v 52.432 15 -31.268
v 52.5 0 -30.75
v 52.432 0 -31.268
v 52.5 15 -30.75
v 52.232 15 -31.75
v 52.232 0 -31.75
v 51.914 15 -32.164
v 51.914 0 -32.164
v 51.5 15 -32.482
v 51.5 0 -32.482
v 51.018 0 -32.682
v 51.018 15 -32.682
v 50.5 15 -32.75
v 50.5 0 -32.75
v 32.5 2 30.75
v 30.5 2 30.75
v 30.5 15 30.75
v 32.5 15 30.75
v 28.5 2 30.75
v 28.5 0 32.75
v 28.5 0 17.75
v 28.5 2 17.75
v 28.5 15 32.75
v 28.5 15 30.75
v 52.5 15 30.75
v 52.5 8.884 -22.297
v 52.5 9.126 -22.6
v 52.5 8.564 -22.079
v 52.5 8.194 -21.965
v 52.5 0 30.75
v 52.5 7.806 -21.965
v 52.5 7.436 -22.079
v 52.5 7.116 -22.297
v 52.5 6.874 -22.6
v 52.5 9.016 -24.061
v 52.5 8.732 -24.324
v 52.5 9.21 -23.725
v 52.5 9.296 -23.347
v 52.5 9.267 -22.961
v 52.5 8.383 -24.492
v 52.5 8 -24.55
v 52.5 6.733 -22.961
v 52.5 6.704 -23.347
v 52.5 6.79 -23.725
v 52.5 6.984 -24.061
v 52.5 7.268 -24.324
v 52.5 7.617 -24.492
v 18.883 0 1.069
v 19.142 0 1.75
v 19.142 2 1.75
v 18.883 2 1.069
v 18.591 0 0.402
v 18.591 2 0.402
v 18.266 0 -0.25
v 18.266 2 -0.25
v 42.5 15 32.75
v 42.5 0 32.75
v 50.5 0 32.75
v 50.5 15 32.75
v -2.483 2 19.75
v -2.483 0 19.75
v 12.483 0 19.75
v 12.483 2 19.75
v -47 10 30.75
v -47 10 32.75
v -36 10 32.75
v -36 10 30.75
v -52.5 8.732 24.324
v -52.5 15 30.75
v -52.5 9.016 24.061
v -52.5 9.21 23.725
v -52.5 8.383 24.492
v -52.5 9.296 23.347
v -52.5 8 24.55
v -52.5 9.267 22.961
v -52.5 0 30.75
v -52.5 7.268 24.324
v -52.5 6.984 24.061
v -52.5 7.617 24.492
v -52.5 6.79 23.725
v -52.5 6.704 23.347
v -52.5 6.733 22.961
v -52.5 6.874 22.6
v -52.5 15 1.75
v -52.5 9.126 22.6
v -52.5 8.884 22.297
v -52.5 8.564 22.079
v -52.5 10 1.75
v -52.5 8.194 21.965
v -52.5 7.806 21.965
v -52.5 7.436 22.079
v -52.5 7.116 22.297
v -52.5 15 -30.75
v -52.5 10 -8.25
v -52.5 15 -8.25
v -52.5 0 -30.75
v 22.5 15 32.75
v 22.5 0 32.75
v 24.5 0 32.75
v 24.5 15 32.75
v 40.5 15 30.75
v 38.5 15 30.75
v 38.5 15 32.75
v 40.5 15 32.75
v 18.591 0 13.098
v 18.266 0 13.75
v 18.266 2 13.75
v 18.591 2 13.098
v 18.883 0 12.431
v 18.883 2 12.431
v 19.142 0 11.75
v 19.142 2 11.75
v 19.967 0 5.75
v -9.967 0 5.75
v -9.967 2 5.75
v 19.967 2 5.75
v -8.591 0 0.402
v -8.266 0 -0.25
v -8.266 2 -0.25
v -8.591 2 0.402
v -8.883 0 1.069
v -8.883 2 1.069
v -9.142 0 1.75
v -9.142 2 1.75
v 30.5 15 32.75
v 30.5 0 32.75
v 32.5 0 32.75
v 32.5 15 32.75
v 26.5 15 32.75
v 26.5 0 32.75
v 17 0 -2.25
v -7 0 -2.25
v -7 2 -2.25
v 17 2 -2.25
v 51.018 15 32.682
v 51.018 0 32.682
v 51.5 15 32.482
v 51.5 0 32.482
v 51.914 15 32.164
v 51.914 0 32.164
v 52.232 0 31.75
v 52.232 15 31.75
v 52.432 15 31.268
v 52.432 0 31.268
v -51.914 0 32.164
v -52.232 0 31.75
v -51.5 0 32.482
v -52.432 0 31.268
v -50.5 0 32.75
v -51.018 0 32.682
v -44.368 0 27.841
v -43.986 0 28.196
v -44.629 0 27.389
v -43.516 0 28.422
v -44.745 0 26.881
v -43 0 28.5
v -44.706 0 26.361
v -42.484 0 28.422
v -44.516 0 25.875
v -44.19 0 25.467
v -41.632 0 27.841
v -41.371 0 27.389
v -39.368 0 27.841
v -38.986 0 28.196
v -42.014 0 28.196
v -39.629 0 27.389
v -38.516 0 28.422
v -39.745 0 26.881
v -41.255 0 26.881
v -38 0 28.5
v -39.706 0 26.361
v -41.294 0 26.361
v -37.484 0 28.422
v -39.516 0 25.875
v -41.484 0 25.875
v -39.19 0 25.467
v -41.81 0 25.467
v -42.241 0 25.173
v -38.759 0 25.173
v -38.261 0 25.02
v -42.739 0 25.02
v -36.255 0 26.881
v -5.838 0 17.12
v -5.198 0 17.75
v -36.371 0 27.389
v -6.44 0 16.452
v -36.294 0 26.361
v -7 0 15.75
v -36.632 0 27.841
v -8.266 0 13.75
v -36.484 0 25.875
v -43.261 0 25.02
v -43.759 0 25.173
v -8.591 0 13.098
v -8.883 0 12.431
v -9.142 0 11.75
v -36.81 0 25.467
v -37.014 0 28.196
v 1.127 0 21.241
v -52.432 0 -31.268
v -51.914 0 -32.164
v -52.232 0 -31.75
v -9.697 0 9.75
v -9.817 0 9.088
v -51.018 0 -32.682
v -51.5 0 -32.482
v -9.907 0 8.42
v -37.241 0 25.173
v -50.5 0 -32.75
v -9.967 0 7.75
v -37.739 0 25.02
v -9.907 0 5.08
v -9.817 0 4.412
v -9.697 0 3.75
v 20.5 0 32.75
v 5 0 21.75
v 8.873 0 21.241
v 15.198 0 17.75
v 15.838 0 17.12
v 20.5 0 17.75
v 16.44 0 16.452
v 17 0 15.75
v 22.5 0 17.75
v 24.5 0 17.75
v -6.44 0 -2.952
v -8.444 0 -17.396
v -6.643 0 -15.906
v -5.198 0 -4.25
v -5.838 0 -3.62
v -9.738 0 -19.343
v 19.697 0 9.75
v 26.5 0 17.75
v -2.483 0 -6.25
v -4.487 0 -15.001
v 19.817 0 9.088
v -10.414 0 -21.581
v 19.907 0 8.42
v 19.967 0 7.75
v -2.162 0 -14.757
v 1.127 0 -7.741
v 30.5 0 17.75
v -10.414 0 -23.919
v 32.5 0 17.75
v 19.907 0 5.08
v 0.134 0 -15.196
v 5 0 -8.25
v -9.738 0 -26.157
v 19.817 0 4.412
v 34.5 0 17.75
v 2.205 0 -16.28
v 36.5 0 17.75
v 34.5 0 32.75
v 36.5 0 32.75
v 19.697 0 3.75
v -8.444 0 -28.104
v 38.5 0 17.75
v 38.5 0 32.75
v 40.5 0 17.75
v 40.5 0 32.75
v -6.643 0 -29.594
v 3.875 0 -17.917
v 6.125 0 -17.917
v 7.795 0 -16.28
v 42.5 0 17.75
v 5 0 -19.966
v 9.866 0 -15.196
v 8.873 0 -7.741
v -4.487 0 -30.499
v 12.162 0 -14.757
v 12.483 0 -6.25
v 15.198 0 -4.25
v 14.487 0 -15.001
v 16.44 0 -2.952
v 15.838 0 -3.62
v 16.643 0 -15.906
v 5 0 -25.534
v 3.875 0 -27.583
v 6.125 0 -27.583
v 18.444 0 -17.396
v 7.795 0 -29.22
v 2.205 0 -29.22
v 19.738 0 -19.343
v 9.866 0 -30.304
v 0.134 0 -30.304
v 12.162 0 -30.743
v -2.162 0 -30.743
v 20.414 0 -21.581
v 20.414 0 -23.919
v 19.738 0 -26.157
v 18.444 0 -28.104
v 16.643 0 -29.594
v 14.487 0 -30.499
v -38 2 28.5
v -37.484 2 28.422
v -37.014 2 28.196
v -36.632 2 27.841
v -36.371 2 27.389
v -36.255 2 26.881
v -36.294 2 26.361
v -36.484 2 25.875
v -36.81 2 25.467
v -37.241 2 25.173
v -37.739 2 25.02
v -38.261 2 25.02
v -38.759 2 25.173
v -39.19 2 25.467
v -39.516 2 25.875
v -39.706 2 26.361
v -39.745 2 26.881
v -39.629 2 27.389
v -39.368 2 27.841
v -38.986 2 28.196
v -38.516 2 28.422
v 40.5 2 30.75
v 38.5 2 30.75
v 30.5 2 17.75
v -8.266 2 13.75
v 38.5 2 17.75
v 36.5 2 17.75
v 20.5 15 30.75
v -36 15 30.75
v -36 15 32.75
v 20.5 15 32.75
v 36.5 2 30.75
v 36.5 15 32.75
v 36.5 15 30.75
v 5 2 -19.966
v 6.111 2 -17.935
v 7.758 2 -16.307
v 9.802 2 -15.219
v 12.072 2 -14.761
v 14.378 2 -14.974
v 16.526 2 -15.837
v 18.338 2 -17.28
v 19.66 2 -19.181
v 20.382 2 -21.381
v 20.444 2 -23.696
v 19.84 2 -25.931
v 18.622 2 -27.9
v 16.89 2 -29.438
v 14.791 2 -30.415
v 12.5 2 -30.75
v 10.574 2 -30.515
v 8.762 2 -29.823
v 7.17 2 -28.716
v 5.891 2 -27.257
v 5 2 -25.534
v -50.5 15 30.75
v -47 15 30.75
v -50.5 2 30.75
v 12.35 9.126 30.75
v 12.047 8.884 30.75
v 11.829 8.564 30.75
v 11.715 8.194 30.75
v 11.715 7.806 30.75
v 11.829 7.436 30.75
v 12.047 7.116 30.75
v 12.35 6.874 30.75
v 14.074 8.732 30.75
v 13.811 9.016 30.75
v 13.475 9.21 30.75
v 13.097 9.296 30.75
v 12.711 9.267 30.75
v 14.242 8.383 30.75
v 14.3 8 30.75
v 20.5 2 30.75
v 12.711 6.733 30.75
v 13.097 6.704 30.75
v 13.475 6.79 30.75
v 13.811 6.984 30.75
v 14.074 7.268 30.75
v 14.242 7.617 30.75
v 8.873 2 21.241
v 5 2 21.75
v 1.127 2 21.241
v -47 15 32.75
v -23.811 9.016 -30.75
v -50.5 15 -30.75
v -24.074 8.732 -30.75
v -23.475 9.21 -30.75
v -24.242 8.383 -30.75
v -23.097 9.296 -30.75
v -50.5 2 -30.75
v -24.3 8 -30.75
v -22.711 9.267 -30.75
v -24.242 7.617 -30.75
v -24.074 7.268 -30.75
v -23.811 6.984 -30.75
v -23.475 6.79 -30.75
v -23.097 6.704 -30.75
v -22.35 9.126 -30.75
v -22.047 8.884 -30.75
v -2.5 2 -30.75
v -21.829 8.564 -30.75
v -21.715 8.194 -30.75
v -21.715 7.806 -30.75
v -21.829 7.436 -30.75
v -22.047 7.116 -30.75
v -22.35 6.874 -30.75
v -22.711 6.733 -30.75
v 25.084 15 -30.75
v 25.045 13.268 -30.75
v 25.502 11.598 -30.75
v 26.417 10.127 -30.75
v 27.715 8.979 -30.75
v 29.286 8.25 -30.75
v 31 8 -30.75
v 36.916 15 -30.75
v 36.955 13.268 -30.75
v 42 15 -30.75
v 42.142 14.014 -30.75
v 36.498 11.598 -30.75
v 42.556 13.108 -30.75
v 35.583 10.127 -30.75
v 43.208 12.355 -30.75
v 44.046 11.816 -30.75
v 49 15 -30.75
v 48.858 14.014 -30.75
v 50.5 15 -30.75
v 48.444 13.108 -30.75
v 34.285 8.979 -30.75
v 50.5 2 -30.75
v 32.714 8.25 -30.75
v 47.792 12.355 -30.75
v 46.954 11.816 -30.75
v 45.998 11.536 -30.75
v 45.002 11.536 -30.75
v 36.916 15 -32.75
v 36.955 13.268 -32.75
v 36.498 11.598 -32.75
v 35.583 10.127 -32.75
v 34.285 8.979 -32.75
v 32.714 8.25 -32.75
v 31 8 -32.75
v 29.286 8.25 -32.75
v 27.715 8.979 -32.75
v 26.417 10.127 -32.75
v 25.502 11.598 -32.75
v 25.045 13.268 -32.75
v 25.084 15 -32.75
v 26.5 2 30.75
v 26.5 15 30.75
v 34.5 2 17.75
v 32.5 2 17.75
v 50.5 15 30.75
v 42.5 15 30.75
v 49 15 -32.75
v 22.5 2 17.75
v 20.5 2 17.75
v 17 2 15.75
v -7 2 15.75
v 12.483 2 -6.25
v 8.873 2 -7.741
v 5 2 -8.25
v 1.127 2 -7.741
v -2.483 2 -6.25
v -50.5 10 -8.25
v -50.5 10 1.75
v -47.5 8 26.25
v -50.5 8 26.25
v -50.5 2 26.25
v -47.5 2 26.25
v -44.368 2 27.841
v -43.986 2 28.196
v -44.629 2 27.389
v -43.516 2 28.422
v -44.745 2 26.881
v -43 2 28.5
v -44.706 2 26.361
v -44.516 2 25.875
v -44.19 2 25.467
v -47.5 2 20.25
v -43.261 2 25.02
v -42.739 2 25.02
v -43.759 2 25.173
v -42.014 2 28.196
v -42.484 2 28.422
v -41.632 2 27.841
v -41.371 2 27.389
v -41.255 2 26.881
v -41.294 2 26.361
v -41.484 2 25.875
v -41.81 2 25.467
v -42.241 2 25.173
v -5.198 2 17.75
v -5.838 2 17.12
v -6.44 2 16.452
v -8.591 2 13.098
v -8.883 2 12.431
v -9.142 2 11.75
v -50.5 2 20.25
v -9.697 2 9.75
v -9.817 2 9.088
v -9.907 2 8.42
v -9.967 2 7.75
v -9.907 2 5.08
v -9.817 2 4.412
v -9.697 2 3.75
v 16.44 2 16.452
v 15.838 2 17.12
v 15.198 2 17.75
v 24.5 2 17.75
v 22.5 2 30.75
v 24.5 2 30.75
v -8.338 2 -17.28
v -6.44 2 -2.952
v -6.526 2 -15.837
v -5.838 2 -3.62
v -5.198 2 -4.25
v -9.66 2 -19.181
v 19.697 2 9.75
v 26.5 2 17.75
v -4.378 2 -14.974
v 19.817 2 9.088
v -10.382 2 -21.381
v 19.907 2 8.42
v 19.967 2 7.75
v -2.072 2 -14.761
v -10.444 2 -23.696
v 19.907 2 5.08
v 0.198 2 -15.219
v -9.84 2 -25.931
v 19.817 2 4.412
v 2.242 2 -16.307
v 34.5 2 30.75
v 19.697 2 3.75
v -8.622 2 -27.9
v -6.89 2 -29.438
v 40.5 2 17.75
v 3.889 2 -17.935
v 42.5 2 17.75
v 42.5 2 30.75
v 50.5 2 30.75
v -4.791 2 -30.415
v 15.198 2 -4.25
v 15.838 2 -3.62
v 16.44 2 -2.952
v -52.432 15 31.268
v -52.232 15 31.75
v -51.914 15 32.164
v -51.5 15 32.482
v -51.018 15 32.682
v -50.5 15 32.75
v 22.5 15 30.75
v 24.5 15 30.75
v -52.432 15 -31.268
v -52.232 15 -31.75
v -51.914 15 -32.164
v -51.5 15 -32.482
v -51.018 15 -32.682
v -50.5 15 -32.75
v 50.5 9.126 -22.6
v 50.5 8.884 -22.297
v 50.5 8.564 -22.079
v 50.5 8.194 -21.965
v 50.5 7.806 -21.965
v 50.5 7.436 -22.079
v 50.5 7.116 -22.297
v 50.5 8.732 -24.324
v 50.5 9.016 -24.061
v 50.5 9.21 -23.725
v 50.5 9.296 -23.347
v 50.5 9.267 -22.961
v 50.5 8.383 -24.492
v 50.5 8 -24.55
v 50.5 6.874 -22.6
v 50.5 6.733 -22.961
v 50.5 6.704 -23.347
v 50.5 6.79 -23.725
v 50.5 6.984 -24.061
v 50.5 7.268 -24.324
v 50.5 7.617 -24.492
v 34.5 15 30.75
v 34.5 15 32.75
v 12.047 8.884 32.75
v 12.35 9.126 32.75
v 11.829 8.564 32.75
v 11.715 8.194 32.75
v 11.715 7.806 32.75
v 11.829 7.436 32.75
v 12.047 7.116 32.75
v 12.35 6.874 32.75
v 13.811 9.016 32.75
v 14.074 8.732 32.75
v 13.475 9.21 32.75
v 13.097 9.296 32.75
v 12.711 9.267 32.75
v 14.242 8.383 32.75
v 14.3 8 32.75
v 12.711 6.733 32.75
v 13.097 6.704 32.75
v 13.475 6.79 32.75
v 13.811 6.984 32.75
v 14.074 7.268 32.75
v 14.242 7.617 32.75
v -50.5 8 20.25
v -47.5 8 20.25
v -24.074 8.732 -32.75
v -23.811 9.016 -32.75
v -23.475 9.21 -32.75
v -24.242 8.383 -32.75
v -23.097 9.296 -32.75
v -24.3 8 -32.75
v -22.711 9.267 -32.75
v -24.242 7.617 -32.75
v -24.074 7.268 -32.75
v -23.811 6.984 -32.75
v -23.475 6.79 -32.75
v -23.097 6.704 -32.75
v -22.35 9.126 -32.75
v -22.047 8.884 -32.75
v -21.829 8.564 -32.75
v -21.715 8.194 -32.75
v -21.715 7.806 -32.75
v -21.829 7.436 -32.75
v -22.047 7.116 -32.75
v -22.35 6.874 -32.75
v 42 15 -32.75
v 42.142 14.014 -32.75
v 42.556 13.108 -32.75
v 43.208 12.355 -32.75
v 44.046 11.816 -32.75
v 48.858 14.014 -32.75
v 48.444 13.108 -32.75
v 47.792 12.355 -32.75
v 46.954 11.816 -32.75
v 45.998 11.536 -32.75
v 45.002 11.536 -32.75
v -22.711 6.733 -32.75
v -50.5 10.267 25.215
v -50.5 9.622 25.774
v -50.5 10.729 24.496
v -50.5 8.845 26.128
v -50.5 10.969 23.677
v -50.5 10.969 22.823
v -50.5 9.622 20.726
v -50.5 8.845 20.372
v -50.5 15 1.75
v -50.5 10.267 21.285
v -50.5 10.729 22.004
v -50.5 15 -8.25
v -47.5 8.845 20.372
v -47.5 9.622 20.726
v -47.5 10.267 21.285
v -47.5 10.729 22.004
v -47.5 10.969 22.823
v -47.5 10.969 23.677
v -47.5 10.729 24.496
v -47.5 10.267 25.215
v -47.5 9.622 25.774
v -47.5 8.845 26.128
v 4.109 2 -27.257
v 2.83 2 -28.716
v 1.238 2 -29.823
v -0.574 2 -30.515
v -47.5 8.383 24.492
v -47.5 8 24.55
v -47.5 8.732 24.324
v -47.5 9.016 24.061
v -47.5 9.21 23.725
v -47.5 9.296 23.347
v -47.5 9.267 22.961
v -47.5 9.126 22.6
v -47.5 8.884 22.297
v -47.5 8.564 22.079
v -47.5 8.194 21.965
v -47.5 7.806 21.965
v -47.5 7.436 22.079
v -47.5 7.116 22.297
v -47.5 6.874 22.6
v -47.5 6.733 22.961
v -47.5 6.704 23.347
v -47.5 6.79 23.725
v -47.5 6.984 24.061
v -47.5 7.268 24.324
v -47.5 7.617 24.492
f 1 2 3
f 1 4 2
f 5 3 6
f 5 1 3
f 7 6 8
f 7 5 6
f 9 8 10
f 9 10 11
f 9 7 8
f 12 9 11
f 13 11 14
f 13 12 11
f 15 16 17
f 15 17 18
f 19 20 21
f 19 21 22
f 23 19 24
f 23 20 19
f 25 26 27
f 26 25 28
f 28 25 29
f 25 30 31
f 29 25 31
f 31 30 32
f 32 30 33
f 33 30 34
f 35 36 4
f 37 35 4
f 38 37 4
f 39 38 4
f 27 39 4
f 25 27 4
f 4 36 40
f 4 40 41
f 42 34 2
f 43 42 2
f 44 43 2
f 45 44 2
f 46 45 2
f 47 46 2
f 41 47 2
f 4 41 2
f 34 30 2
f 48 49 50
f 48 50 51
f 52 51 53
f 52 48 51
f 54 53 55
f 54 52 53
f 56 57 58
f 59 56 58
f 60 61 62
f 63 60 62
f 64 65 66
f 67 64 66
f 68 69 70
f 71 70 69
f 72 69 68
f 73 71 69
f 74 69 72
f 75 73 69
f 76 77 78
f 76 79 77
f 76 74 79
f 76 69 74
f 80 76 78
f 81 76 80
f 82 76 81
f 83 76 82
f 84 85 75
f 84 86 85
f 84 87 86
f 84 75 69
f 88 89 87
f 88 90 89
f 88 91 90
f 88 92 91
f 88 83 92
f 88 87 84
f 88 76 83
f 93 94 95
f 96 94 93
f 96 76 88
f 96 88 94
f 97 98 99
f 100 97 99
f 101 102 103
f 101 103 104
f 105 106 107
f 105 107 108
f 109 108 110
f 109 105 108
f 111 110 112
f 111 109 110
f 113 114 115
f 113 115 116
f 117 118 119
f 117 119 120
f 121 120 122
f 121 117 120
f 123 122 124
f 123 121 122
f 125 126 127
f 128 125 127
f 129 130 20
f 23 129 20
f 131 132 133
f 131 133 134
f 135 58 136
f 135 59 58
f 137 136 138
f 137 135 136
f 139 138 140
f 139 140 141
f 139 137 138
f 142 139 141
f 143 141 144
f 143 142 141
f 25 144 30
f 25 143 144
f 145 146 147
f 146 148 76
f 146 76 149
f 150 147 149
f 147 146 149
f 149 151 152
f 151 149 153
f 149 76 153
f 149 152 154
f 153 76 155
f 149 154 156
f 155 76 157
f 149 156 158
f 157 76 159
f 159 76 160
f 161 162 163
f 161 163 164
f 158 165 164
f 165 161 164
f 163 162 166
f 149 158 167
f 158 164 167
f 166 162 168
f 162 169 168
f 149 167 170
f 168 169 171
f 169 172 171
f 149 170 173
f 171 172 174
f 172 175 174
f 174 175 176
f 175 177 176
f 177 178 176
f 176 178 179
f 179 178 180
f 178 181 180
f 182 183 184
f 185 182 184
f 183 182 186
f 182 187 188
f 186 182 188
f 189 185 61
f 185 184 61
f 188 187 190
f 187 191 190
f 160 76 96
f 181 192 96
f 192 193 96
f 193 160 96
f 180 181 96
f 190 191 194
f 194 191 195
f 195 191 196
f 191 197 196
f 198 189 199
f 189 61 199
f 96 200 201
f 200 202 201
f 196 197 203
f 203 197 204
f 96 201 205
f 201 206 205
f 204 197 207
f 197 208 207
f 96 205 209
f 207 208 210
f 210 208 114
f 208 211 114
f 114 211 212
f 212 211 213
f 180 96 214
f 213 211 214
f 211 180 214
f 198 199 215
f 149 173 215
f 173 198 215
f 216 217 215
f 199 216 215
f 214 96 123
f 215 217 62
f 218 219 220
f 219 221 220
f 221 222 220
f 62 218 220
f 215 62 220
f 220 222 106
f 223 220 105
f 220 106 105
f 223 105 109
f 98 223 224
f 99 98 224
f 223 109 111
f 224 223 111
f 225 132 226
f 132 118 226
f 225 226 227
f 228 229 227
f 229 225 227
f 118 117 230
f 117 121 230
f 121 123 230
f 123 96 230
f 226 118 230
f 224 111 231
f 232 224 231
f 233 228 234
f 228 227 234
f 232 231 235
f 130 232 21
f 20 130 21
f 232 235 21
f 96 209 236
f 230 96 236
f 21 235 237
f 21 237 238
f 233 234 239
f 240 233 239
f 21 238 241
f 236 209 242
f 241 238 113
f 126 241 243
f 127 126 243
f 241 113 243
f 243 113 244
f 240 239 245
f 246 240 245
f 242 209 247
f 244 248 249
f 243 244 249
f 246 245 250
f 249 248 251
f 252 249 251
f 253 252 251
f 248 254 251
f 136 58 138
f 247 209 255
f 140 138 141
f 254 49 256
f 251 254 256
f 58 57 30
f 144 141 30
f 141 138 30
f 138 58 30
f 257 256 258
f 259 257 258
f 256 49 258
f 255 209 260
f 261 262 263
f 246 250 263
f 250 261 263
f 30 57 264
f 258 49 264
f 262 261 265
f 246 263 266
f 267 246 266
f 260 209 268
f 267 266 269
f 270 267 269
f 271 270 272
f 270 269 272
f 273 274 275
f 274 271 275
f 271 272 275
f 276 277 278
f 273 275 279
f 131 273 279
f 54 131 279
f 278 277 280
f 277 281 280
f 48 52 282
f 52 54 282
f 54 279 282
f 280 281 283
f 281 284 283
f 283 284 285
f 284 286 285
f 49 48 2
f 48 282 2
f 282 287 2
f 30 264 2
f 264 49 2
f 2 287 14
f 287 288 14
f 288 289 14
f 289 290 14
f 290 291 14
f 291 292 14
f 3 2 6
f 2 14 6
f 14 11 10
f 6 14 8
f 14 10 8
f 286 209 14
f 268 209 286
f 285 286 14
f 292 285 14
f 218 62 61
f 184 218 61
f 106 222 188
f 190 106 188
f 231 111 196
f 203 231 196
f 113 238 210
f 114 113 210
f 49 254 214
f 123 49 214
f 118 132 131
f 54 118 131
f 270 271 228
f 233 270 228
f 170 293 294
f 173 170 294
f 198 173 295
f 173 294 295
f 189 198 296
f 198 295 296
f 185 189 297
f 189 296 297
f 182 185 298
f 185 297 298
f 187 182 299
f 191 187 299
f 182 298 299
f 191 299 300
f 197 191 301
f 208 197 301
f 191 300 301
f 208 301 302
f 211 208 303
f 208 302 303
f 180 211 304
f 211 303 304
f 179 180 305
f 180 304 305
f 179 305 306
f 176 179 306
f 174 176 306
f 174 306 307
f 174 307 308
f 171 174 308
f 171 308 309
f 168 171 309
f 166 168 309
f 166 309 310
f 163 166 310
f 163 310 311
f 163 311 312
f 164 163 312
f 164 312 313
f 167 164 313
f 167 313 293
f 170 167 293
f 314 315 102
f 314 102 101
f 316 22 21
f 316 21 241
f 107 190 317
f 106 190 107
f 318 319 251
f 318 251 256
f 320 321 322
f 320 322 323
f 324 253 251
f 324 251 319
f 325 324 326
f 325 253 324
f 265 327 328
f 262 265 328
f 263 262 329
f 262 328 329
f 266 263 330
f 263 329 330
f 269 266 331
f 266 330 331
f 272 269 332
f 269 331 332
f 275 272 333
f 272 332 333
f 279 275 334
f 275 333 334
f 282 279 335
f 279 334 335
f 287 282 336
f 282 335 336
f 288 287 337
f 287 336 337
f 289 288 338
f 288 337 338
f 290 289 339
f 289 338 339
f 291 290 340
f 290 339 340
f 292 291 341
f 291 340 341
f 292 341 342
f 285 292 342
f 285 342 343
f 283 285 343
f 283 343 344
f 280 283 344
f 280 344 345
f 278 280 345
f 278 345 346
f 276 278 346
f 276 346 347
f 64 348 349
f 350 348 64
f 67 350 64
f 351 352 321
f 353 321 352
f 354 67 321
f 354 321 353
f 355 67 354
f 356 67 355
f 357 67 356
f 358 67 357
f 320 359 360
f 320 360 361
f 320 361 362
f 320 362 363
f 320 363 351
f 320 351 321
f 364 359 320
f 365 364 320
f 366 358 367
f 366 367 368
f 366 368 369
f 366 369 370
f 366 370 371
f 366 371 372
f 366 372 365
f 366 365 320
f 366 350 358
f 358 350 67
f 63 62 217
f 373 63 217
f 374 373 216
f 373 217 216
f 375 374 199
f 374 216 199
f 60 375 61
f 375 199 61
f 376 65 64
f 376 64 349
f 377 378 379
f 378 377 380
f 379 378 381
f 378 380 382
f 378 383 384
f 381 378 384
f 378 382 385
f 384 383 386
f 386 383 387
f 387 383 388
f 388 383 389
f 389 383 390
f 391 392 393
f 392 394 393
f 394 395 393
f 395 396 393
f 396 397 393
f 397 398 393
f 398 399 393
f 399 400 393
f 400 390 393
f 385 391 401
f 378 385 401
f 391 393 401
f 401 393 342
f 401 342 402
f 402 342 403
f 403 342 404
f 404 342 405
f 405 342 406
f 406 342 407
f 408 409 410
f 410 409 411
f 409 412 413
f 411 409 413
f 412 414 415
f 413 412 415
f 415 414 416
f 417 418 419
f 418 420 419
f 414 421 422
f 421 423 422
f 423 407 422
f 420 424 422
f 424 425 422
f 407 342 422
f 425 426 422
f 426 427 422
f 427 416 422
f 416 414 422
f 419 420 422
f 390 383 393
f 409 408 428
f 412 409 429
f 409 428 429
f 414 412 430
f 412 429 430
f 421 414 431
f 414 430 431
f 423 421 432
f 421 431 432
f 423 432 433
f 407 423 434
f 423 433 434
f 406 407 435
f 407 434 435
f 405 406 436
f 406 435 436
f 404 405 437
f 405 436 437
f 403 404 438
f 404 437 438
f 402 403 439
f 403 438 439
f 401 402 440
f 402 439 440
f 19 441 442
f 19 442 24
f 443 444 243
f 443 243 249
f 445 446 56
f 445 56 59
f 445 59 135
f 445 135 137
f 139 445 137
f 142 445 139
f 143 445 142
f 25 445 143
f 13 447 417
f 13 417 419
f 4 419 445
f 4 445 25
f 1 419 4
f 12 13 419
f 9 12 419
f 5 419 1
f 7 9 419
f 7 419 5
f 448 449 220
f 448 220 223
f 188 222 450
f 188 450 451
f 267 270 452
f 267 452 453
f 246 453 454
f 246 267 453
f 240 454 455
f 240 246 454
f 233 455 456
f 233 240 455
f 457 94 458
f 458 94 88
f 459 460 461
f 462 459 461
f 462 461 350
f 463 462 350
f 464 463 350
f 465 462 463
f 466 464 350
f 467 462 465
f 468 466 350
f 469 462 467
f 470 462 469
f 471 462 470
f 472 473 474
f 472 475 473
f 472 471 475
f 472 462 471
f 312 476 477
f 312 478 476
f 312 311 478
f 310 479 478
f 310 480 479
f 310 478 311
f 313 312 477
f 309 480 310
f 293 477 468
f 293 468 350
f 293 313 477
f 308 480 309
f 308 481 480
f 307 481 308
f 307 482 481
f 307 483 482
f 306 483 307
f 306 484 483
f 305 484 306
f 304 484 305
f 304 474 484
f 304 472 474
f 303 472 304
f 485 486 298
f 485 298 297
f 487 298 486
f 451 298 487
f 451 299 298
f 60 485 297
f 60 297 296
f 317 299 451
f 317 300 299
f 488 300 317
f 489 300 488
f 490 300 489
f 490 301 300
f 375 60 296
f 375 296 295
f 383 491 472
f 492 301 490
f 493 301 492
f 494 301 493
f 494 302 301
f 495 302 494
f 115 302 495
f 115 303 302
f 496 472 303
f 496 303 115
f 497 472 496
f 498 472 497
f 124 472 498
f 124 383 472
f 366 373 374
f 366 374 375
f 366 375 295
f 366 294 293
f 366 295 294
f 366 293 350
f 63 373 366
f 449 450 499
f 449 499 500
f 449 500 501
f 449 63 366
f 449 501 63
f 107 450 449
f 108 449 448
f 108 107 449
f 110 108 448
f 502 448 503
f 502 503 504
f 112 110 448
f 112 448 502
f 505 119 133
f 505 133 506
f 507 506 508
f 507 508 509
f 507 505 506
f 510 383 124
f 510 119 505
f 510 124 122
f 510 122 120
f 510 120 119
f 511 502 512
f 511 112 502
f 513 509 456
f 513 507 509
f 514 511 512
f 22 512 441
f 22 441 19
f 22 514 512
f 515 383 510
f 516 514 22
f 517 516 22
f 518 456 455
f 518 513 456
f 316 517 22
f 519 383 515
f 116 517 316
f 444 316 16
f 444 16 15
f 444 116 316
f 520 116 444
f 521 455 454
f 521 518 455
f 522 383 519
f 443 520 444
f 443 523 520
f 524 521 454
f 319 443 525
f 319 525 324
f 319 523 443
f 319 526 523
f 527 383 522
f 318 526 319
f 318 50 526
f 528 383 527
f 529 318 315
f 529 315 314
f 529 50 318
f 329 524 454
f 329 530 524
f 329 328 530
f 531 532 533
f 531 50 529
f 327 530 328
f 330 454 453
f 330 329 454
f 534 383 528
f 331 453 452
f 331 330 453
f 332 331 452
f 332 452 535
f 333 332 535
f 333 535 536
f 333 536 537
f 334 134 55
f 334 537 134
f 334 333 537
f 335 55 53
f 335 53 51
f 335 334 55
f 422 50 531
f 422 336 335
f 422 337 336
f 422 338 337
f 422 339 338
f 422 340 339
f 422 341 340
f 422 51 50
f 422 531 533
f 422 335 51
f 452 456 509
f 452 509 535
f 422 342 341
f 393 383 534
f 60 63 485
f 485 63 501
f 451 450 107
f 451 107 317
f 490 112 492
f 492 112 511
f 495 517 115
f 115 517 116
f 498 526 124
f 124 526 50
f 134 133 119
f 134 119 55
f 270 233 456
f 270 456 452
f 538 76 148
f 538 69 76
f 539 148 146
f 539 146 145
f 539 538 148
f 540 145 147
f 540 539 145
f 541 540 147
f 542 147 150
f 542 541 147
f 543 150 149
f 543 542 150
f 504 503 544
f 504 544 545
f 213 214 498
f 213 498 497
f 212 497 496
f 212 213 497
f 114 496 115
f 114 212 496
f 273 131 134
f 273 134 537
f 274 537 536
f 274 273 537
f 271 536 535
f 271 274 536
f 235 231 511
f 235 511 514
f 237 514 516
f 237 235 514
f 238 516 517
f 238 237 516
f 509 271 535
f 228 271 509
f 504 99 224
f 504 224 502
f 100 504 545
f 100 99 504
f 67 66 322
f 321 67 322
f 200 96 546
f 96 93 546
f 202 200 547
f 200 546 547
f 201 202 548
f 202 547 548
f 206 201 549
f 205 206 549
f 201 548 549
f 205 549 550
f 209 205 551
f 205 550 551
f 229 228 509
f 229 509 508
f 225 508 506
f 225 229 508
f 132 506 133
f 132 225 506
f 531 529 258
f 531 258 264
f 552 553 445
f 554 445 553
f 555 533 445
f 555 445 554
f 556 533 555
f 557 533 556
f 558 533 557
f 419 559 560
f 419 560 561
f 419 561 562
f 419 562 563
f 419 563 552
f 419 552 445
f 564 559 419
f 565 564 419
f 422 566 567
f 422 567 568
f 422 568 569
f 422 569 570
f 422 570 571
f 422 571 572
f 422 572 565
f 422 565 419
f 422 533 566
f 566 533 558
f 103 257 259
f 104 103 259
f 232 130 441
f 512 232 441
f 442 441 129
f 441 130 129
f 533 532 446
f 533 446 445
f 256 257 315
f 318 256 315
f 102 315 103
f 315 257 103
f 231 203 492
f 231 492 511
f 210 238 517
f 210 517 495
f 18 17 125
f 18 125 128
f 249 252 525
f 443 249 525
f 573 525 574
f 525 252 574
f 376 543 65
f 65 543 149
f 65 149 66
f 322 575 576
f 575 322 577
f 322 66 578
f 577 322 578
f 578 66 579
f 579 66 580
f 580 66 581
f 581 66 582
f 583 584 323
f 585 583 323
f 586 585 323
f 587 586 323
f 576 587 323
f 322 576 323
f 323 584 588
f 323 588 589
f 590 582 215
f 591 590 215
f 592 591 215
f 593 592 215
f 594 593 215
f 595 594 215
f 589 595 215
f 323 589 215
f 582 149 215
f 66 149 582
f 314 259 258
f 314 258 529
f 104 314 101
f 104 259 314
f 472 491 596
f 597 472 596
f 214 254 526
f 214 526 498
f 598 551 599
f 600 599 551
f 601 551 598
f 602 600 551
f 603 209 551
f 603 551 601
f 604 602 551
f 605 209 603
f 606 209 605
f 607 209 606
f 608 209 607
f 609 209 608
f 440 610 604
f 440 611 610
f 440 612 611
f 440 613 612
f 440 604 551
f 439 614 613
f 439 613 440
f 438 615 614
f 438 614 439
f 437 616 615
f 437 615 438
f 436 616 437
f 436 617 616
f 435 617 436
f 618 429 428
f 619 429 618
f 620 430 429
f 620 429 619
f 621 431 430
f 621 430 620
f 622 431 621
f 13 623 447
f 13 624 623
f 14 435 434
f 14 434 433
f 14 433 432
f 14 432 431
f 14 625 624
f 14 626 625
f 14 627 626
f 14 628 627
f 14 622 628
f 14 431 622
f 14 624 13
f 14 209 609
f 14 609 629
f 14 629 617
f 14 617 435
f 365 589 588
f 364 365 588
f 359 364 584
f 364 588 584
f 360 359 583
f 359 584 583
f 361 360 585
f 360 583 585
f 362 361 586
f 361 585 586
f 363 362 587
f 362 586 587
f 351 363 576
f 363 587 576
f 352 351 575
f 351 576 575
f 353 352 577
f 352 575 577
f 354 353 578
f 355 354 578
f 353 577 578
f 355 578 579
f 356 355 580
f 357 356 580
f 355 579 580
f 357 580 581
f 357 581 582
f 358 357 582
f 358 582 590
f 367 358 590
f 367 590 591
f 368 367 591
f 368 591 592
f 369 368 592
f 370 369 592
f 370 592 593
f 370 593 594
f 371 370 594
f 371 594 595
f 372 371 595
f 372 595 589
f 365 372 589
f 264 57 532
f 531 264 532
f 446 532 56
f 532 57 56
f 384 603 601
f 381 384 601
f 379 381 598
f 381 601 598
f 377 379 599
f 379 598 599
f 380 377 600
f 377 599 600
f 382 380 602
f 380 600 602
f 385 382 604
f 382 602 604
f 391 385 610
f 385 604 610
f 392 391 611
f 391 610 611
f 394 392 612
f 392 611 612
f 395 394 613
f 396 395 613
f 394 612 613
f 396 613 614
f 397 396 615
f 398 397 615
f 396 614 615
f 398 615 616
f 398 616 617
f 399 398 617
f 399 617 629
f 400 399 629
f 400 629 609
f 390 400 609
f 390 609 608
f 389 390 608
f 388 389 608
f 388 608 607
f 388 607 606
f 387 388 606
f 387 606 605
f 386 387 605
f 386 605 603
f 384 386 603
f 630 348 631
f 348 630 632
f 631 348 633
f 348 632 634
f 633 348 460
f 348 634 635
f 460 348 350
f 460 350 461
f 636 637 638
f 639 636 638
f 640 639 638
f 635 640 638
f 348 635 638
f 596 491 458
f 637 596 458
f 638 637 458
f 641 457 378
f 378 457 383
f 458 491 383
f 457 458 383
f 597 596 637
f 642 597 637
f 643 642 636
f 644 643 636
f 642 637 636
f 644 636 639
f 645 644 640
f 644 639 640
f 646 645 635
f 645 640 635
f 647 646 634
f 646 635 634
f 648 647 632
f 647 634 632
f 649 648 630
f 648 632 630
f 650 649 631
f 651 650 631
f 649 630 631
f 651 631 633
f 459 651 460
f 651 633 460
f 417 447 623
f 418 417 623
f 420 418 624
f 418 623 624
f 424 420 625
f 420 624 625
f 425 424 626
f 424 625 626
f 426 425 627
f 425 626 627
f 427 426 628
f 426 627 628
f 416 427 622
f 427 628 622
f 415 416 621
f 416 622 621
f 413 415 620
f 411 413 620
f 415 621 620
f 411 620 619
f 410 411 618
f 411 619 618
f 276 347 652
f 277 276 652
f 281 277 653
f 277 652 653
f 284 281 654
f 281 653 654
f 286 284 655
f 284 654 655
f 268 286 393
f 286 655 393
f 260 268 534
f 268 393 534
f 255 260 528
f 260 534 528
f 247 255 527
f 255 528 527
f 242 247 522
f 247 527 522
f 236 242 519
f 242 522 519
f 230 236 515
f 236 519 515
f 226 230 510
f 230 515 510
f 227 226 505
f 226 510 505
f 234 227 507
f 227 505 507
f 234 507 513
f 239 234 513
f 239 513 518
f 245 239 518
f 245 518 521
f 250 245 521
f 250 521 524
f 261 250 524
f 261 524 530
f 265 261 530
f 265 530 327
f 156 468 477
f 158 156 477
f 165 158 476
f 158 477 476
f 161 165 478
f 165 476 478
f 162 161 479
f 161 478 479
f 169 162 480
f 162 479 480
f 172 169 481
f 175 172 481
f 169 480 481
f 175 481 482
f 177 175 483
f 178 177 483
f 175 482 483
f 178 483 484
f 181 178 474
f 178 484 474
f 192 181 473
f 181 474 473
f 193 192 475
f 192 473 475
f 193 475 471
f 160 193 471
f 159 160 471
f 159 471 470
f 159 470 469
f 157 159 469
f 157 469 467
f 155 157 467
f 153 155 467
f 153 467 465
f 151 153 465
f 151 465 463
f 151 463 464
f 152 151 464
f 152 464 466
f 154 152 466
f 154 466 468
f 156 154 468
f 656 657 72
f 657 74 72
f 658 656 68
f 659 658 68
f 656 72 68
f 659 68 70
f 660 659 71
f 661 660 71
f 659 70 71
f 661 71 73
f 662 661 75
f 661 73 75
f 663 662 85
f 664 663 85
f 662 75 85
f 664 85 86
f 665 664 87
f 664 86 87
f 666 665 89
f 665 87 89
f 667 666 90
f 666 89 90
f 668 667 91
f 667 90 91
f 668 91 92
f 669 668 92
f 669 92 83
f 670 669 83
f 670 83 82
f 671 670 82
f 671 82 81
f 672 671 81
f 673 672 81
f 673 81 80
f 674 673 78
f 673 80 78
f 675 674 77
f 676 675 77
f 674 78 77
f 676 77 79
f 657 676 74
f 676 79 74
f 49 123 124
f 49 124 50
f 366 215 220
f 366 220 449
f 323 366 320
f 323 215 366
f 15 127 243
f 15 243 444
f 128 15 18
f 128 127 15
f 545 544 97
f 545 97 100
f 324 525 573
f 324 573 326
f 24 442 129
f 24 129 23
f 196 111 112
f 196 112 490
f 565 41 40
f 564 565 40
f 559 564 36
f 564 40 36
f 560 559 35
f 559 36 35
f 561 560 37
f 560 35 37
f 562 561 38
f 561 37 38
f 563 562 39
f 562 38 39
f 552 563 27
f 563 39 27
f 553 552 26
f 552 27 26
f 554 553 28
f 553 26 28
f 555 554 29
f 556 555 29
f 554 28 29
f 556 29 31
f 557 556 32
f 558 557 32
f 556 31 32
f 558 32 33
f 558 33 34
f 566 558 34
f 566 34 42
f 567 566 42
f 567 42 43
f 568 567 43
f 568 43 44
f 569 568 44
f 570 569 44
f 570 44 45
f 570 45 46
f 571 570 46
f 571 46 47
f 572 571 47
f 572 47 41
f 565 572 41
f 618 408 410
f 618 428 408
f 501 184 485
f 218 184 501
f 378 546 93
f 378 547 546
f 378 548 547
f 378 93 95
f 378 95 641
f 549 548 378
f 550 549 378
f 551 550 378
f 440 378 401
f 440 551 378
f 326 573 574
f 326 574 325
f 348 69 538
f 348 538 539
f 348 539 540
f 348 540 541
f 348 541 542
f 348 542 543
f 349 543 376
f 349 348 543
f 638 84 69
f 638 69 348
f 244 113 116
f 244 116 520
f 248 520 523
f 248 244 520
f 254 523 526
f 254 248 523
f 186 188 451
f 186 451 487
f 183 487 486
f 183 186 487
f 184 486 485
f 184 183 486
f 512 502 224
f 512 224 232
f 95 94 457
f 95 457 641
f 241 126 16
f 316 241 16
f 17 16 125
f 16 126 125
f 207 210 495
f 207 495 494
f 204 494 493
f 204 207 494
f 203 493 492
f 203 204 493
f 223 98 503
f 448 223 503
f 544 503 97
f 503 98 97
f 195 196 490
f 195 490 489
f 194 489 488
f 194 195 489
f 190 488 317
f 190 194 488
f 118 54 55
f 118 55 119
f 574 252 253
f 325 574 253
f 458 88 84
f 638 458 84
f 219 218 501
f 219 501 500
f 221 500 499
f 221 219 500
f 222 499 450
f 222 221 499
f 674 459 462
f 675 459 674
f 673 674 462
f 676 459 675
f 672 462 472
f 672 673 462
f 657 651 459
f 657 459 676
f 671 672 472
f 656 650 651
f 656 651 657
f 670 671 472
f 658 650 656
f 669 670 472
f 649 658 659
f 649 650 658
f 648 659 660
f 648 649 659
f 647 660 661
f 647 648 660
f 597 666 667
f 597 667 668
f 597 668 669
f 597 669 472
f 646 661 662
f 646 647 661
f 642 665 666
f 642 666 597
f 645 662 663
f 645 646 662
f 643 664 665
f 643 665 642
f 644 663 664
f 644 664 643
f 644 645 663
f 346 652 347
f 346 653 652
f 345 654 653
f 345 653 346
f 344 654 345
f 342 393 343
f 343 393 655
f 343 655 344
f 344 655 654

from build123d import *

# Parameters (mm, degrees)
SKETCH_1_W           = 105
SKETCH_1_H           = 65.5
EXTRUDE_1_DEPTH      = 15
SHELL_1_T            = -2
FILLET_1_R           = 2
SKETCH_2_W           = 10
SKETCH_2_H           = 5
CUT_EXTRUDE_1_DEPTH  = 14
SKETCH_3_W           = 11
SKETCH_3_H           = 5
CUT_EXTRUDE_2_DEPTH  = 14
SKETCH_5_W           = 2
SKETCH_5_H           = 17.663494354
CUT_EXTRUDE_3_DEPTH  = 15
SKETCH_6_R           = 3.5
SKETCH_6_R_2         = 6
CUT_EXTRUDE_4_DEPTH  = 15
CUT_EXTRUDE_5_DEPTH  = 15
CUT_EXTRUDE_6_DEPTH  = 15
SKETCH_9_R           = 1.75
CUT_EXTRUDE_7_DEPTH  = 15
SKETCH_10_R          = 1.3
CUT_EXTRUDE_8_DEPTH  = 15
SKETCH_12_R          = 1.3
CUT_EXTRUDE_9_DEPTH  = 15
EXTRUDE_3_DEPTH      = 3
SKETCH_16_R          = 1.3
CUT_EXTRUDE_11_DEPTH = 8
SKETCH_17_R          = 1.3
CUT_EXTRUDE_12_DEPTH = 39
SKETCH_18_R          = 1.3
CUT_EXTRUDE_13_DEPTH = 39


with BuildPart() as part:
    # 草图1 → 凸台-拉伸1 (new body)
    with BuildSketch(Plane(origin=(0, 0, 0), x_dir=(1, 0, 0), z_dir=(0, 1, 0))):
        Rectangle(SKETCH_1_W, SKETCH_1_H)
    extrude(amount=EXTRUDE_1_DEPTH)

    # 抽壳1
    shell_1_openings = [part.faces().sort_by_distance(p)[0] for p in [
        (0, 15, 0),
    ]]
    offset(amount=SHELL_1_T, openings=shell_1_openings, kind=Kind.INTERSECTION)

    # 圆角1
    fillet_1_edges = [part.edges().sort_by_distance(p)[0] for p in [
        (-52.5, 7.5, -32.75),
        (52.5, 7.5, -32.75),
        (52.5, 7.5, 32.75),
        (-52.5, 7.5, 32.75),
    ]]
    fillet(fillet_1_edges, radius=FILLET_1_R)

    # 草图2 → 切除-拉伸1 (cut)
    with BuildSketch(Plane.ZY.offset(52.5)):
        with Locations((-3.25, 12.5)):
            Rectangle(SKETCH_2_W, SKETCH_2_H)
    extrude(amount=-CUT_EXTRUDE_1_DEPTH, mode=Mode.SUBTRACT)

    # 草图3 → 切除-拉伸2 (cut)
    with BuildSketch(Plane.XY.offset(32.75)):
        with Locations((-41.5, 12.5)):
            Rectangle(SKETCH_3_W, SKETCH_3_H)
    extrude(amount=-CUT_EXTRUDE_2_DEPTH, mode=Mode.SUBTRACT)

    # 草图5 → 切除-拉伸3 (cut)
    with BuildSketch(Plane.XY.offset(32.75)):
        with Locations((41.5, 6.168252823)):
            Rectangle(SKETCH_5_W, SKETCH_5_H)
        with Locations((37.5, 6.168252823)):
            Rectangle(SKETCH_5_W, SKETCH_5_H)
        with Locations((33.5, 6.168252823)):
            Rectangle(SKETCH_5_W, SKETCH_5_H)
        with Locations((29.5, 6.168252823)):
            Rectangle(SKETCH_5_W, SKETCH_5_H)
        with Locations((25.5, 6.168252823)):
            Rectangle(SKETCH_5_W, SKETCH_5_H)
        with Locations((21.5, 6.168252823)):
            Rectangle(SKETCH_5_W, SKETCH_5_H)
    extrude(amount=-CUT_EXTRUDE_3_DEPTH, mode=Mode.SUBTRACT)

    # 草图6 → 切除-拉伸4 (cut)
    with BuildSketch(Plane(origin=(0, 0, -32.75), x_dir=(-1, 0, 0), z_dir=(0, 0, -1))):
        with Locations((-45.5, 15)):
            Circle(SKETCH_6_R)
        with Locations((-31, 14)):
            Circle(SKETCH_6_R_2)
    extrude(amount=-CUT_EXTRUDE_4_DEPTH, mode=Mode.SUBTRACT)

    # 草图7 → 切除-拉伸5 (cut)
    with BuildSketch(Plane(origin=(0, 2, 0), x_dir=(1, 0, 0), z_dir=(0, 1, 0))):
        with BuildLine():
            ThreePointArc((5, 19.966117819), (20.5, 22.75), (5, 25.533882181))
            ThreePointArc((5, 25.533882181), (-10.5, 22.75), (5, 19.966117819))
        make_face()
    extrude(amount=-CUT_EXTRUDE_5_DEPTH, mode=Mode.SUBTRACT)

    # 草图8 → 切除-拉伸6 (cut)
    with BuildSketch(Plane.XZ):
        with BuildLine():
            Line((-2.483314774, 19.75), (12.483314774, 19.75))
            ThreePointArc((12.483314774, 19.75), (5, 21.75), (-2.483314774, 19.75))
        make_face()
        with BuildLine():
            Line((-5.198039027, 17.75), (15.198039027, 17.75))
            ThreePointArc((15.198039027, 17.75), (16.143977484, 16.790506254), (17, 15.75))
            Line((17, 15.75), (-7, 15.75))
            ThreePointArc((-7, 15.75), (-6.143977484, 16.790506254), (-5.198039027, 17.75))
        make_face()
        with BuildLine():
            Line((-8.266499161, 13.75), (18.266499161, 13.75))
            ThreePointArc((18.266499161, 13.75), (18.740753807, 12.765952527), (19.142135624, 11.75))
            Line((19.142135624, 11.75), (-9.142135624, 11.75))
            ThreePointArc((-9.142135624, 11.75), (-8.740753807, 12.765952527), (-8.266499161, 13.75))
        make_face()
        with BuildLine():
            Line((-9.696938457, 9.75), (19.696938457, 9.75))
            ThreePointArc((19.696938457, 9.75), (19.865457163, 8.754540676), (19.966629547, 7.75))
            Line((19.966629547, 7.75), (-9.966629547, 7.75))
            ThreePointArc((-9.966629547, 7.75), (-9.865457163, 8.754540676), (-9.696938457, 9.75))
        make_face()
        with BuildLine():
            Line((-9.966629547, 5.75), (19.966629547, 5.75))
            ThreePointArc((19.966629547, 5.75), (19.865457163, 4.745459324), (19.696938457, 3.75))
            Line((19.696938457, 3.75), (-9.696938457, 3.75))
            ThreePointArc((-9.696938457, 3.75), (-9.865457163, 4.745459324), (-9.966629547, 5.75))
        make_face()
        with BuildLine():
            Line((-9.142135624, 1.75), (19.142135624, 1.75))
            ThreePointArc((19.142135624, 1.75), (18.740753807, 0.734047473), (18.266499161, -0.25))
            Line((18.266499161, -0.25), (-8.266499161, -0.25))
            ThreePointArc((-8.266499161, -0.25), (-8.740753807, 0.734047473), (-9.142135624, 1.75))
        make_face()
        with BuildLine():
            Line((-7, -2.25), (17, -2.25))
            ThreePointArc((17, -2.25), (16.143977484, -3.290506254), (15.198039027, -4.25))
            Line((15.198039027, -4.25), (-5.198039027, -4.25))
            ThreePointArc((-5.198039027, -4.25), (-6.143977484, -3.290506254), (-7, -2.25))
        make_face()
        with BuildLine():
            Line((-2.483314774, -6.25), (12.483314774, -6.25))
            ThreePointArc((12.483314774, -6.25), (5, -8.25), (-2.483314774, -6.25))
        make_face()
    extrude(amount=-CUT_EXTRUDE_6_DEPTH, mode=Mode.SUBTRACT)

    # 草图9 → 切除-拉伸7 (cut)
    with BuildSketch(Plane(origin=(0, 2, 0), x_dir=(1, 0, 0), z_dir=(0, 1, 0))):
        with Locations(Location((-43, -26.75, 0), (0, 0, 270))):
            Circle(SKETCH_9_R)
        with Locations(Location((-38, -26.75, 0), (0, 0, 270))):
            Circle(SKETCH_9_R)
    extrude(amount=-CUT_EXTRUDE_7_DEPTH, mode=Mode.SUBTRACT)

    # 草图10 → 切除-拉伸8 (cut)
    with BuildSketch(Plane.ZY.offset(52.5)):
        with Locations((23.25, 8)):
            Circle(SKETCH_10_R)
    extrude(amount=-CUT_EXTRUDE_8_DEPTH, mode=Mode.SUBTRACT)

    # 草图12 → 切除-拉伸9 (cut)
    with BuildSketch(Plane(origin=(52.5, 0, 0), x_dir=(0, 0, -1), z_dir=(1, 0, 0))):
        with Locations((23.25, 8)):
            Circle(SKETCH_12_R)
    extrude(amount=-CUT_EXTRUDE_9_DEPTH, mode=Mode.SUBTRACT)

    # 草图13 → 凸台-拉伸3 (add)
    with BuildSketch(Plane(origin=(-50.5, 0, 0), x_dir=(0, 0, -1), z_dir=(1, 0, 0))):
        with BuildLine():
            Line((-26.25, 8), (-26.25, 2))
            Line((-26.25, 2), (-20.25, 2))
            Line((-20.25, 2), (-20.25, 8))
            ThreePointArc((-20.25, 8), (-23.25, 11), (-26.25, 8))
        make_face()
    extrude(amount=EXTRUDE_3_DEPTH)

    # 草图16 → 切除-拉伸11 (cut)
    with BuildSketch(Plane.ZY.offset(50.5)):
        with Locations((23.25, 8)):
            Circle(SKETCH_16_R)
    extrude(amount=-CUT_EXTRUDE_11_DEPTH, mode=Mode.SUBTRACT)

    # 草图17 → 切除-拉伸12 (cut)
    with BuildSketch(Plane.XY.offset(32.75)):
        with Locations((13, 8)):
            Circle(SKETCH_17_R)
    extrude(amount=-CUT_EXTRUDE_12_DEPTH, mode=Mode.SUBTRACT)

    # 草图18 → 切除-拉伸13 (cut)
    with BuildSketch(Plane(origin=(0, 0, -32.75), x_dir=(-1, 0, 0), z_dir=(0, 0, -1))):
        with Locations((23, 8)):
            Circle(SKETCH_18_R)
    extrude(amount=-CUT_EXTRUDE_13_DEPTH, mode=Mode.SUBTRACT)


solid = part.part
